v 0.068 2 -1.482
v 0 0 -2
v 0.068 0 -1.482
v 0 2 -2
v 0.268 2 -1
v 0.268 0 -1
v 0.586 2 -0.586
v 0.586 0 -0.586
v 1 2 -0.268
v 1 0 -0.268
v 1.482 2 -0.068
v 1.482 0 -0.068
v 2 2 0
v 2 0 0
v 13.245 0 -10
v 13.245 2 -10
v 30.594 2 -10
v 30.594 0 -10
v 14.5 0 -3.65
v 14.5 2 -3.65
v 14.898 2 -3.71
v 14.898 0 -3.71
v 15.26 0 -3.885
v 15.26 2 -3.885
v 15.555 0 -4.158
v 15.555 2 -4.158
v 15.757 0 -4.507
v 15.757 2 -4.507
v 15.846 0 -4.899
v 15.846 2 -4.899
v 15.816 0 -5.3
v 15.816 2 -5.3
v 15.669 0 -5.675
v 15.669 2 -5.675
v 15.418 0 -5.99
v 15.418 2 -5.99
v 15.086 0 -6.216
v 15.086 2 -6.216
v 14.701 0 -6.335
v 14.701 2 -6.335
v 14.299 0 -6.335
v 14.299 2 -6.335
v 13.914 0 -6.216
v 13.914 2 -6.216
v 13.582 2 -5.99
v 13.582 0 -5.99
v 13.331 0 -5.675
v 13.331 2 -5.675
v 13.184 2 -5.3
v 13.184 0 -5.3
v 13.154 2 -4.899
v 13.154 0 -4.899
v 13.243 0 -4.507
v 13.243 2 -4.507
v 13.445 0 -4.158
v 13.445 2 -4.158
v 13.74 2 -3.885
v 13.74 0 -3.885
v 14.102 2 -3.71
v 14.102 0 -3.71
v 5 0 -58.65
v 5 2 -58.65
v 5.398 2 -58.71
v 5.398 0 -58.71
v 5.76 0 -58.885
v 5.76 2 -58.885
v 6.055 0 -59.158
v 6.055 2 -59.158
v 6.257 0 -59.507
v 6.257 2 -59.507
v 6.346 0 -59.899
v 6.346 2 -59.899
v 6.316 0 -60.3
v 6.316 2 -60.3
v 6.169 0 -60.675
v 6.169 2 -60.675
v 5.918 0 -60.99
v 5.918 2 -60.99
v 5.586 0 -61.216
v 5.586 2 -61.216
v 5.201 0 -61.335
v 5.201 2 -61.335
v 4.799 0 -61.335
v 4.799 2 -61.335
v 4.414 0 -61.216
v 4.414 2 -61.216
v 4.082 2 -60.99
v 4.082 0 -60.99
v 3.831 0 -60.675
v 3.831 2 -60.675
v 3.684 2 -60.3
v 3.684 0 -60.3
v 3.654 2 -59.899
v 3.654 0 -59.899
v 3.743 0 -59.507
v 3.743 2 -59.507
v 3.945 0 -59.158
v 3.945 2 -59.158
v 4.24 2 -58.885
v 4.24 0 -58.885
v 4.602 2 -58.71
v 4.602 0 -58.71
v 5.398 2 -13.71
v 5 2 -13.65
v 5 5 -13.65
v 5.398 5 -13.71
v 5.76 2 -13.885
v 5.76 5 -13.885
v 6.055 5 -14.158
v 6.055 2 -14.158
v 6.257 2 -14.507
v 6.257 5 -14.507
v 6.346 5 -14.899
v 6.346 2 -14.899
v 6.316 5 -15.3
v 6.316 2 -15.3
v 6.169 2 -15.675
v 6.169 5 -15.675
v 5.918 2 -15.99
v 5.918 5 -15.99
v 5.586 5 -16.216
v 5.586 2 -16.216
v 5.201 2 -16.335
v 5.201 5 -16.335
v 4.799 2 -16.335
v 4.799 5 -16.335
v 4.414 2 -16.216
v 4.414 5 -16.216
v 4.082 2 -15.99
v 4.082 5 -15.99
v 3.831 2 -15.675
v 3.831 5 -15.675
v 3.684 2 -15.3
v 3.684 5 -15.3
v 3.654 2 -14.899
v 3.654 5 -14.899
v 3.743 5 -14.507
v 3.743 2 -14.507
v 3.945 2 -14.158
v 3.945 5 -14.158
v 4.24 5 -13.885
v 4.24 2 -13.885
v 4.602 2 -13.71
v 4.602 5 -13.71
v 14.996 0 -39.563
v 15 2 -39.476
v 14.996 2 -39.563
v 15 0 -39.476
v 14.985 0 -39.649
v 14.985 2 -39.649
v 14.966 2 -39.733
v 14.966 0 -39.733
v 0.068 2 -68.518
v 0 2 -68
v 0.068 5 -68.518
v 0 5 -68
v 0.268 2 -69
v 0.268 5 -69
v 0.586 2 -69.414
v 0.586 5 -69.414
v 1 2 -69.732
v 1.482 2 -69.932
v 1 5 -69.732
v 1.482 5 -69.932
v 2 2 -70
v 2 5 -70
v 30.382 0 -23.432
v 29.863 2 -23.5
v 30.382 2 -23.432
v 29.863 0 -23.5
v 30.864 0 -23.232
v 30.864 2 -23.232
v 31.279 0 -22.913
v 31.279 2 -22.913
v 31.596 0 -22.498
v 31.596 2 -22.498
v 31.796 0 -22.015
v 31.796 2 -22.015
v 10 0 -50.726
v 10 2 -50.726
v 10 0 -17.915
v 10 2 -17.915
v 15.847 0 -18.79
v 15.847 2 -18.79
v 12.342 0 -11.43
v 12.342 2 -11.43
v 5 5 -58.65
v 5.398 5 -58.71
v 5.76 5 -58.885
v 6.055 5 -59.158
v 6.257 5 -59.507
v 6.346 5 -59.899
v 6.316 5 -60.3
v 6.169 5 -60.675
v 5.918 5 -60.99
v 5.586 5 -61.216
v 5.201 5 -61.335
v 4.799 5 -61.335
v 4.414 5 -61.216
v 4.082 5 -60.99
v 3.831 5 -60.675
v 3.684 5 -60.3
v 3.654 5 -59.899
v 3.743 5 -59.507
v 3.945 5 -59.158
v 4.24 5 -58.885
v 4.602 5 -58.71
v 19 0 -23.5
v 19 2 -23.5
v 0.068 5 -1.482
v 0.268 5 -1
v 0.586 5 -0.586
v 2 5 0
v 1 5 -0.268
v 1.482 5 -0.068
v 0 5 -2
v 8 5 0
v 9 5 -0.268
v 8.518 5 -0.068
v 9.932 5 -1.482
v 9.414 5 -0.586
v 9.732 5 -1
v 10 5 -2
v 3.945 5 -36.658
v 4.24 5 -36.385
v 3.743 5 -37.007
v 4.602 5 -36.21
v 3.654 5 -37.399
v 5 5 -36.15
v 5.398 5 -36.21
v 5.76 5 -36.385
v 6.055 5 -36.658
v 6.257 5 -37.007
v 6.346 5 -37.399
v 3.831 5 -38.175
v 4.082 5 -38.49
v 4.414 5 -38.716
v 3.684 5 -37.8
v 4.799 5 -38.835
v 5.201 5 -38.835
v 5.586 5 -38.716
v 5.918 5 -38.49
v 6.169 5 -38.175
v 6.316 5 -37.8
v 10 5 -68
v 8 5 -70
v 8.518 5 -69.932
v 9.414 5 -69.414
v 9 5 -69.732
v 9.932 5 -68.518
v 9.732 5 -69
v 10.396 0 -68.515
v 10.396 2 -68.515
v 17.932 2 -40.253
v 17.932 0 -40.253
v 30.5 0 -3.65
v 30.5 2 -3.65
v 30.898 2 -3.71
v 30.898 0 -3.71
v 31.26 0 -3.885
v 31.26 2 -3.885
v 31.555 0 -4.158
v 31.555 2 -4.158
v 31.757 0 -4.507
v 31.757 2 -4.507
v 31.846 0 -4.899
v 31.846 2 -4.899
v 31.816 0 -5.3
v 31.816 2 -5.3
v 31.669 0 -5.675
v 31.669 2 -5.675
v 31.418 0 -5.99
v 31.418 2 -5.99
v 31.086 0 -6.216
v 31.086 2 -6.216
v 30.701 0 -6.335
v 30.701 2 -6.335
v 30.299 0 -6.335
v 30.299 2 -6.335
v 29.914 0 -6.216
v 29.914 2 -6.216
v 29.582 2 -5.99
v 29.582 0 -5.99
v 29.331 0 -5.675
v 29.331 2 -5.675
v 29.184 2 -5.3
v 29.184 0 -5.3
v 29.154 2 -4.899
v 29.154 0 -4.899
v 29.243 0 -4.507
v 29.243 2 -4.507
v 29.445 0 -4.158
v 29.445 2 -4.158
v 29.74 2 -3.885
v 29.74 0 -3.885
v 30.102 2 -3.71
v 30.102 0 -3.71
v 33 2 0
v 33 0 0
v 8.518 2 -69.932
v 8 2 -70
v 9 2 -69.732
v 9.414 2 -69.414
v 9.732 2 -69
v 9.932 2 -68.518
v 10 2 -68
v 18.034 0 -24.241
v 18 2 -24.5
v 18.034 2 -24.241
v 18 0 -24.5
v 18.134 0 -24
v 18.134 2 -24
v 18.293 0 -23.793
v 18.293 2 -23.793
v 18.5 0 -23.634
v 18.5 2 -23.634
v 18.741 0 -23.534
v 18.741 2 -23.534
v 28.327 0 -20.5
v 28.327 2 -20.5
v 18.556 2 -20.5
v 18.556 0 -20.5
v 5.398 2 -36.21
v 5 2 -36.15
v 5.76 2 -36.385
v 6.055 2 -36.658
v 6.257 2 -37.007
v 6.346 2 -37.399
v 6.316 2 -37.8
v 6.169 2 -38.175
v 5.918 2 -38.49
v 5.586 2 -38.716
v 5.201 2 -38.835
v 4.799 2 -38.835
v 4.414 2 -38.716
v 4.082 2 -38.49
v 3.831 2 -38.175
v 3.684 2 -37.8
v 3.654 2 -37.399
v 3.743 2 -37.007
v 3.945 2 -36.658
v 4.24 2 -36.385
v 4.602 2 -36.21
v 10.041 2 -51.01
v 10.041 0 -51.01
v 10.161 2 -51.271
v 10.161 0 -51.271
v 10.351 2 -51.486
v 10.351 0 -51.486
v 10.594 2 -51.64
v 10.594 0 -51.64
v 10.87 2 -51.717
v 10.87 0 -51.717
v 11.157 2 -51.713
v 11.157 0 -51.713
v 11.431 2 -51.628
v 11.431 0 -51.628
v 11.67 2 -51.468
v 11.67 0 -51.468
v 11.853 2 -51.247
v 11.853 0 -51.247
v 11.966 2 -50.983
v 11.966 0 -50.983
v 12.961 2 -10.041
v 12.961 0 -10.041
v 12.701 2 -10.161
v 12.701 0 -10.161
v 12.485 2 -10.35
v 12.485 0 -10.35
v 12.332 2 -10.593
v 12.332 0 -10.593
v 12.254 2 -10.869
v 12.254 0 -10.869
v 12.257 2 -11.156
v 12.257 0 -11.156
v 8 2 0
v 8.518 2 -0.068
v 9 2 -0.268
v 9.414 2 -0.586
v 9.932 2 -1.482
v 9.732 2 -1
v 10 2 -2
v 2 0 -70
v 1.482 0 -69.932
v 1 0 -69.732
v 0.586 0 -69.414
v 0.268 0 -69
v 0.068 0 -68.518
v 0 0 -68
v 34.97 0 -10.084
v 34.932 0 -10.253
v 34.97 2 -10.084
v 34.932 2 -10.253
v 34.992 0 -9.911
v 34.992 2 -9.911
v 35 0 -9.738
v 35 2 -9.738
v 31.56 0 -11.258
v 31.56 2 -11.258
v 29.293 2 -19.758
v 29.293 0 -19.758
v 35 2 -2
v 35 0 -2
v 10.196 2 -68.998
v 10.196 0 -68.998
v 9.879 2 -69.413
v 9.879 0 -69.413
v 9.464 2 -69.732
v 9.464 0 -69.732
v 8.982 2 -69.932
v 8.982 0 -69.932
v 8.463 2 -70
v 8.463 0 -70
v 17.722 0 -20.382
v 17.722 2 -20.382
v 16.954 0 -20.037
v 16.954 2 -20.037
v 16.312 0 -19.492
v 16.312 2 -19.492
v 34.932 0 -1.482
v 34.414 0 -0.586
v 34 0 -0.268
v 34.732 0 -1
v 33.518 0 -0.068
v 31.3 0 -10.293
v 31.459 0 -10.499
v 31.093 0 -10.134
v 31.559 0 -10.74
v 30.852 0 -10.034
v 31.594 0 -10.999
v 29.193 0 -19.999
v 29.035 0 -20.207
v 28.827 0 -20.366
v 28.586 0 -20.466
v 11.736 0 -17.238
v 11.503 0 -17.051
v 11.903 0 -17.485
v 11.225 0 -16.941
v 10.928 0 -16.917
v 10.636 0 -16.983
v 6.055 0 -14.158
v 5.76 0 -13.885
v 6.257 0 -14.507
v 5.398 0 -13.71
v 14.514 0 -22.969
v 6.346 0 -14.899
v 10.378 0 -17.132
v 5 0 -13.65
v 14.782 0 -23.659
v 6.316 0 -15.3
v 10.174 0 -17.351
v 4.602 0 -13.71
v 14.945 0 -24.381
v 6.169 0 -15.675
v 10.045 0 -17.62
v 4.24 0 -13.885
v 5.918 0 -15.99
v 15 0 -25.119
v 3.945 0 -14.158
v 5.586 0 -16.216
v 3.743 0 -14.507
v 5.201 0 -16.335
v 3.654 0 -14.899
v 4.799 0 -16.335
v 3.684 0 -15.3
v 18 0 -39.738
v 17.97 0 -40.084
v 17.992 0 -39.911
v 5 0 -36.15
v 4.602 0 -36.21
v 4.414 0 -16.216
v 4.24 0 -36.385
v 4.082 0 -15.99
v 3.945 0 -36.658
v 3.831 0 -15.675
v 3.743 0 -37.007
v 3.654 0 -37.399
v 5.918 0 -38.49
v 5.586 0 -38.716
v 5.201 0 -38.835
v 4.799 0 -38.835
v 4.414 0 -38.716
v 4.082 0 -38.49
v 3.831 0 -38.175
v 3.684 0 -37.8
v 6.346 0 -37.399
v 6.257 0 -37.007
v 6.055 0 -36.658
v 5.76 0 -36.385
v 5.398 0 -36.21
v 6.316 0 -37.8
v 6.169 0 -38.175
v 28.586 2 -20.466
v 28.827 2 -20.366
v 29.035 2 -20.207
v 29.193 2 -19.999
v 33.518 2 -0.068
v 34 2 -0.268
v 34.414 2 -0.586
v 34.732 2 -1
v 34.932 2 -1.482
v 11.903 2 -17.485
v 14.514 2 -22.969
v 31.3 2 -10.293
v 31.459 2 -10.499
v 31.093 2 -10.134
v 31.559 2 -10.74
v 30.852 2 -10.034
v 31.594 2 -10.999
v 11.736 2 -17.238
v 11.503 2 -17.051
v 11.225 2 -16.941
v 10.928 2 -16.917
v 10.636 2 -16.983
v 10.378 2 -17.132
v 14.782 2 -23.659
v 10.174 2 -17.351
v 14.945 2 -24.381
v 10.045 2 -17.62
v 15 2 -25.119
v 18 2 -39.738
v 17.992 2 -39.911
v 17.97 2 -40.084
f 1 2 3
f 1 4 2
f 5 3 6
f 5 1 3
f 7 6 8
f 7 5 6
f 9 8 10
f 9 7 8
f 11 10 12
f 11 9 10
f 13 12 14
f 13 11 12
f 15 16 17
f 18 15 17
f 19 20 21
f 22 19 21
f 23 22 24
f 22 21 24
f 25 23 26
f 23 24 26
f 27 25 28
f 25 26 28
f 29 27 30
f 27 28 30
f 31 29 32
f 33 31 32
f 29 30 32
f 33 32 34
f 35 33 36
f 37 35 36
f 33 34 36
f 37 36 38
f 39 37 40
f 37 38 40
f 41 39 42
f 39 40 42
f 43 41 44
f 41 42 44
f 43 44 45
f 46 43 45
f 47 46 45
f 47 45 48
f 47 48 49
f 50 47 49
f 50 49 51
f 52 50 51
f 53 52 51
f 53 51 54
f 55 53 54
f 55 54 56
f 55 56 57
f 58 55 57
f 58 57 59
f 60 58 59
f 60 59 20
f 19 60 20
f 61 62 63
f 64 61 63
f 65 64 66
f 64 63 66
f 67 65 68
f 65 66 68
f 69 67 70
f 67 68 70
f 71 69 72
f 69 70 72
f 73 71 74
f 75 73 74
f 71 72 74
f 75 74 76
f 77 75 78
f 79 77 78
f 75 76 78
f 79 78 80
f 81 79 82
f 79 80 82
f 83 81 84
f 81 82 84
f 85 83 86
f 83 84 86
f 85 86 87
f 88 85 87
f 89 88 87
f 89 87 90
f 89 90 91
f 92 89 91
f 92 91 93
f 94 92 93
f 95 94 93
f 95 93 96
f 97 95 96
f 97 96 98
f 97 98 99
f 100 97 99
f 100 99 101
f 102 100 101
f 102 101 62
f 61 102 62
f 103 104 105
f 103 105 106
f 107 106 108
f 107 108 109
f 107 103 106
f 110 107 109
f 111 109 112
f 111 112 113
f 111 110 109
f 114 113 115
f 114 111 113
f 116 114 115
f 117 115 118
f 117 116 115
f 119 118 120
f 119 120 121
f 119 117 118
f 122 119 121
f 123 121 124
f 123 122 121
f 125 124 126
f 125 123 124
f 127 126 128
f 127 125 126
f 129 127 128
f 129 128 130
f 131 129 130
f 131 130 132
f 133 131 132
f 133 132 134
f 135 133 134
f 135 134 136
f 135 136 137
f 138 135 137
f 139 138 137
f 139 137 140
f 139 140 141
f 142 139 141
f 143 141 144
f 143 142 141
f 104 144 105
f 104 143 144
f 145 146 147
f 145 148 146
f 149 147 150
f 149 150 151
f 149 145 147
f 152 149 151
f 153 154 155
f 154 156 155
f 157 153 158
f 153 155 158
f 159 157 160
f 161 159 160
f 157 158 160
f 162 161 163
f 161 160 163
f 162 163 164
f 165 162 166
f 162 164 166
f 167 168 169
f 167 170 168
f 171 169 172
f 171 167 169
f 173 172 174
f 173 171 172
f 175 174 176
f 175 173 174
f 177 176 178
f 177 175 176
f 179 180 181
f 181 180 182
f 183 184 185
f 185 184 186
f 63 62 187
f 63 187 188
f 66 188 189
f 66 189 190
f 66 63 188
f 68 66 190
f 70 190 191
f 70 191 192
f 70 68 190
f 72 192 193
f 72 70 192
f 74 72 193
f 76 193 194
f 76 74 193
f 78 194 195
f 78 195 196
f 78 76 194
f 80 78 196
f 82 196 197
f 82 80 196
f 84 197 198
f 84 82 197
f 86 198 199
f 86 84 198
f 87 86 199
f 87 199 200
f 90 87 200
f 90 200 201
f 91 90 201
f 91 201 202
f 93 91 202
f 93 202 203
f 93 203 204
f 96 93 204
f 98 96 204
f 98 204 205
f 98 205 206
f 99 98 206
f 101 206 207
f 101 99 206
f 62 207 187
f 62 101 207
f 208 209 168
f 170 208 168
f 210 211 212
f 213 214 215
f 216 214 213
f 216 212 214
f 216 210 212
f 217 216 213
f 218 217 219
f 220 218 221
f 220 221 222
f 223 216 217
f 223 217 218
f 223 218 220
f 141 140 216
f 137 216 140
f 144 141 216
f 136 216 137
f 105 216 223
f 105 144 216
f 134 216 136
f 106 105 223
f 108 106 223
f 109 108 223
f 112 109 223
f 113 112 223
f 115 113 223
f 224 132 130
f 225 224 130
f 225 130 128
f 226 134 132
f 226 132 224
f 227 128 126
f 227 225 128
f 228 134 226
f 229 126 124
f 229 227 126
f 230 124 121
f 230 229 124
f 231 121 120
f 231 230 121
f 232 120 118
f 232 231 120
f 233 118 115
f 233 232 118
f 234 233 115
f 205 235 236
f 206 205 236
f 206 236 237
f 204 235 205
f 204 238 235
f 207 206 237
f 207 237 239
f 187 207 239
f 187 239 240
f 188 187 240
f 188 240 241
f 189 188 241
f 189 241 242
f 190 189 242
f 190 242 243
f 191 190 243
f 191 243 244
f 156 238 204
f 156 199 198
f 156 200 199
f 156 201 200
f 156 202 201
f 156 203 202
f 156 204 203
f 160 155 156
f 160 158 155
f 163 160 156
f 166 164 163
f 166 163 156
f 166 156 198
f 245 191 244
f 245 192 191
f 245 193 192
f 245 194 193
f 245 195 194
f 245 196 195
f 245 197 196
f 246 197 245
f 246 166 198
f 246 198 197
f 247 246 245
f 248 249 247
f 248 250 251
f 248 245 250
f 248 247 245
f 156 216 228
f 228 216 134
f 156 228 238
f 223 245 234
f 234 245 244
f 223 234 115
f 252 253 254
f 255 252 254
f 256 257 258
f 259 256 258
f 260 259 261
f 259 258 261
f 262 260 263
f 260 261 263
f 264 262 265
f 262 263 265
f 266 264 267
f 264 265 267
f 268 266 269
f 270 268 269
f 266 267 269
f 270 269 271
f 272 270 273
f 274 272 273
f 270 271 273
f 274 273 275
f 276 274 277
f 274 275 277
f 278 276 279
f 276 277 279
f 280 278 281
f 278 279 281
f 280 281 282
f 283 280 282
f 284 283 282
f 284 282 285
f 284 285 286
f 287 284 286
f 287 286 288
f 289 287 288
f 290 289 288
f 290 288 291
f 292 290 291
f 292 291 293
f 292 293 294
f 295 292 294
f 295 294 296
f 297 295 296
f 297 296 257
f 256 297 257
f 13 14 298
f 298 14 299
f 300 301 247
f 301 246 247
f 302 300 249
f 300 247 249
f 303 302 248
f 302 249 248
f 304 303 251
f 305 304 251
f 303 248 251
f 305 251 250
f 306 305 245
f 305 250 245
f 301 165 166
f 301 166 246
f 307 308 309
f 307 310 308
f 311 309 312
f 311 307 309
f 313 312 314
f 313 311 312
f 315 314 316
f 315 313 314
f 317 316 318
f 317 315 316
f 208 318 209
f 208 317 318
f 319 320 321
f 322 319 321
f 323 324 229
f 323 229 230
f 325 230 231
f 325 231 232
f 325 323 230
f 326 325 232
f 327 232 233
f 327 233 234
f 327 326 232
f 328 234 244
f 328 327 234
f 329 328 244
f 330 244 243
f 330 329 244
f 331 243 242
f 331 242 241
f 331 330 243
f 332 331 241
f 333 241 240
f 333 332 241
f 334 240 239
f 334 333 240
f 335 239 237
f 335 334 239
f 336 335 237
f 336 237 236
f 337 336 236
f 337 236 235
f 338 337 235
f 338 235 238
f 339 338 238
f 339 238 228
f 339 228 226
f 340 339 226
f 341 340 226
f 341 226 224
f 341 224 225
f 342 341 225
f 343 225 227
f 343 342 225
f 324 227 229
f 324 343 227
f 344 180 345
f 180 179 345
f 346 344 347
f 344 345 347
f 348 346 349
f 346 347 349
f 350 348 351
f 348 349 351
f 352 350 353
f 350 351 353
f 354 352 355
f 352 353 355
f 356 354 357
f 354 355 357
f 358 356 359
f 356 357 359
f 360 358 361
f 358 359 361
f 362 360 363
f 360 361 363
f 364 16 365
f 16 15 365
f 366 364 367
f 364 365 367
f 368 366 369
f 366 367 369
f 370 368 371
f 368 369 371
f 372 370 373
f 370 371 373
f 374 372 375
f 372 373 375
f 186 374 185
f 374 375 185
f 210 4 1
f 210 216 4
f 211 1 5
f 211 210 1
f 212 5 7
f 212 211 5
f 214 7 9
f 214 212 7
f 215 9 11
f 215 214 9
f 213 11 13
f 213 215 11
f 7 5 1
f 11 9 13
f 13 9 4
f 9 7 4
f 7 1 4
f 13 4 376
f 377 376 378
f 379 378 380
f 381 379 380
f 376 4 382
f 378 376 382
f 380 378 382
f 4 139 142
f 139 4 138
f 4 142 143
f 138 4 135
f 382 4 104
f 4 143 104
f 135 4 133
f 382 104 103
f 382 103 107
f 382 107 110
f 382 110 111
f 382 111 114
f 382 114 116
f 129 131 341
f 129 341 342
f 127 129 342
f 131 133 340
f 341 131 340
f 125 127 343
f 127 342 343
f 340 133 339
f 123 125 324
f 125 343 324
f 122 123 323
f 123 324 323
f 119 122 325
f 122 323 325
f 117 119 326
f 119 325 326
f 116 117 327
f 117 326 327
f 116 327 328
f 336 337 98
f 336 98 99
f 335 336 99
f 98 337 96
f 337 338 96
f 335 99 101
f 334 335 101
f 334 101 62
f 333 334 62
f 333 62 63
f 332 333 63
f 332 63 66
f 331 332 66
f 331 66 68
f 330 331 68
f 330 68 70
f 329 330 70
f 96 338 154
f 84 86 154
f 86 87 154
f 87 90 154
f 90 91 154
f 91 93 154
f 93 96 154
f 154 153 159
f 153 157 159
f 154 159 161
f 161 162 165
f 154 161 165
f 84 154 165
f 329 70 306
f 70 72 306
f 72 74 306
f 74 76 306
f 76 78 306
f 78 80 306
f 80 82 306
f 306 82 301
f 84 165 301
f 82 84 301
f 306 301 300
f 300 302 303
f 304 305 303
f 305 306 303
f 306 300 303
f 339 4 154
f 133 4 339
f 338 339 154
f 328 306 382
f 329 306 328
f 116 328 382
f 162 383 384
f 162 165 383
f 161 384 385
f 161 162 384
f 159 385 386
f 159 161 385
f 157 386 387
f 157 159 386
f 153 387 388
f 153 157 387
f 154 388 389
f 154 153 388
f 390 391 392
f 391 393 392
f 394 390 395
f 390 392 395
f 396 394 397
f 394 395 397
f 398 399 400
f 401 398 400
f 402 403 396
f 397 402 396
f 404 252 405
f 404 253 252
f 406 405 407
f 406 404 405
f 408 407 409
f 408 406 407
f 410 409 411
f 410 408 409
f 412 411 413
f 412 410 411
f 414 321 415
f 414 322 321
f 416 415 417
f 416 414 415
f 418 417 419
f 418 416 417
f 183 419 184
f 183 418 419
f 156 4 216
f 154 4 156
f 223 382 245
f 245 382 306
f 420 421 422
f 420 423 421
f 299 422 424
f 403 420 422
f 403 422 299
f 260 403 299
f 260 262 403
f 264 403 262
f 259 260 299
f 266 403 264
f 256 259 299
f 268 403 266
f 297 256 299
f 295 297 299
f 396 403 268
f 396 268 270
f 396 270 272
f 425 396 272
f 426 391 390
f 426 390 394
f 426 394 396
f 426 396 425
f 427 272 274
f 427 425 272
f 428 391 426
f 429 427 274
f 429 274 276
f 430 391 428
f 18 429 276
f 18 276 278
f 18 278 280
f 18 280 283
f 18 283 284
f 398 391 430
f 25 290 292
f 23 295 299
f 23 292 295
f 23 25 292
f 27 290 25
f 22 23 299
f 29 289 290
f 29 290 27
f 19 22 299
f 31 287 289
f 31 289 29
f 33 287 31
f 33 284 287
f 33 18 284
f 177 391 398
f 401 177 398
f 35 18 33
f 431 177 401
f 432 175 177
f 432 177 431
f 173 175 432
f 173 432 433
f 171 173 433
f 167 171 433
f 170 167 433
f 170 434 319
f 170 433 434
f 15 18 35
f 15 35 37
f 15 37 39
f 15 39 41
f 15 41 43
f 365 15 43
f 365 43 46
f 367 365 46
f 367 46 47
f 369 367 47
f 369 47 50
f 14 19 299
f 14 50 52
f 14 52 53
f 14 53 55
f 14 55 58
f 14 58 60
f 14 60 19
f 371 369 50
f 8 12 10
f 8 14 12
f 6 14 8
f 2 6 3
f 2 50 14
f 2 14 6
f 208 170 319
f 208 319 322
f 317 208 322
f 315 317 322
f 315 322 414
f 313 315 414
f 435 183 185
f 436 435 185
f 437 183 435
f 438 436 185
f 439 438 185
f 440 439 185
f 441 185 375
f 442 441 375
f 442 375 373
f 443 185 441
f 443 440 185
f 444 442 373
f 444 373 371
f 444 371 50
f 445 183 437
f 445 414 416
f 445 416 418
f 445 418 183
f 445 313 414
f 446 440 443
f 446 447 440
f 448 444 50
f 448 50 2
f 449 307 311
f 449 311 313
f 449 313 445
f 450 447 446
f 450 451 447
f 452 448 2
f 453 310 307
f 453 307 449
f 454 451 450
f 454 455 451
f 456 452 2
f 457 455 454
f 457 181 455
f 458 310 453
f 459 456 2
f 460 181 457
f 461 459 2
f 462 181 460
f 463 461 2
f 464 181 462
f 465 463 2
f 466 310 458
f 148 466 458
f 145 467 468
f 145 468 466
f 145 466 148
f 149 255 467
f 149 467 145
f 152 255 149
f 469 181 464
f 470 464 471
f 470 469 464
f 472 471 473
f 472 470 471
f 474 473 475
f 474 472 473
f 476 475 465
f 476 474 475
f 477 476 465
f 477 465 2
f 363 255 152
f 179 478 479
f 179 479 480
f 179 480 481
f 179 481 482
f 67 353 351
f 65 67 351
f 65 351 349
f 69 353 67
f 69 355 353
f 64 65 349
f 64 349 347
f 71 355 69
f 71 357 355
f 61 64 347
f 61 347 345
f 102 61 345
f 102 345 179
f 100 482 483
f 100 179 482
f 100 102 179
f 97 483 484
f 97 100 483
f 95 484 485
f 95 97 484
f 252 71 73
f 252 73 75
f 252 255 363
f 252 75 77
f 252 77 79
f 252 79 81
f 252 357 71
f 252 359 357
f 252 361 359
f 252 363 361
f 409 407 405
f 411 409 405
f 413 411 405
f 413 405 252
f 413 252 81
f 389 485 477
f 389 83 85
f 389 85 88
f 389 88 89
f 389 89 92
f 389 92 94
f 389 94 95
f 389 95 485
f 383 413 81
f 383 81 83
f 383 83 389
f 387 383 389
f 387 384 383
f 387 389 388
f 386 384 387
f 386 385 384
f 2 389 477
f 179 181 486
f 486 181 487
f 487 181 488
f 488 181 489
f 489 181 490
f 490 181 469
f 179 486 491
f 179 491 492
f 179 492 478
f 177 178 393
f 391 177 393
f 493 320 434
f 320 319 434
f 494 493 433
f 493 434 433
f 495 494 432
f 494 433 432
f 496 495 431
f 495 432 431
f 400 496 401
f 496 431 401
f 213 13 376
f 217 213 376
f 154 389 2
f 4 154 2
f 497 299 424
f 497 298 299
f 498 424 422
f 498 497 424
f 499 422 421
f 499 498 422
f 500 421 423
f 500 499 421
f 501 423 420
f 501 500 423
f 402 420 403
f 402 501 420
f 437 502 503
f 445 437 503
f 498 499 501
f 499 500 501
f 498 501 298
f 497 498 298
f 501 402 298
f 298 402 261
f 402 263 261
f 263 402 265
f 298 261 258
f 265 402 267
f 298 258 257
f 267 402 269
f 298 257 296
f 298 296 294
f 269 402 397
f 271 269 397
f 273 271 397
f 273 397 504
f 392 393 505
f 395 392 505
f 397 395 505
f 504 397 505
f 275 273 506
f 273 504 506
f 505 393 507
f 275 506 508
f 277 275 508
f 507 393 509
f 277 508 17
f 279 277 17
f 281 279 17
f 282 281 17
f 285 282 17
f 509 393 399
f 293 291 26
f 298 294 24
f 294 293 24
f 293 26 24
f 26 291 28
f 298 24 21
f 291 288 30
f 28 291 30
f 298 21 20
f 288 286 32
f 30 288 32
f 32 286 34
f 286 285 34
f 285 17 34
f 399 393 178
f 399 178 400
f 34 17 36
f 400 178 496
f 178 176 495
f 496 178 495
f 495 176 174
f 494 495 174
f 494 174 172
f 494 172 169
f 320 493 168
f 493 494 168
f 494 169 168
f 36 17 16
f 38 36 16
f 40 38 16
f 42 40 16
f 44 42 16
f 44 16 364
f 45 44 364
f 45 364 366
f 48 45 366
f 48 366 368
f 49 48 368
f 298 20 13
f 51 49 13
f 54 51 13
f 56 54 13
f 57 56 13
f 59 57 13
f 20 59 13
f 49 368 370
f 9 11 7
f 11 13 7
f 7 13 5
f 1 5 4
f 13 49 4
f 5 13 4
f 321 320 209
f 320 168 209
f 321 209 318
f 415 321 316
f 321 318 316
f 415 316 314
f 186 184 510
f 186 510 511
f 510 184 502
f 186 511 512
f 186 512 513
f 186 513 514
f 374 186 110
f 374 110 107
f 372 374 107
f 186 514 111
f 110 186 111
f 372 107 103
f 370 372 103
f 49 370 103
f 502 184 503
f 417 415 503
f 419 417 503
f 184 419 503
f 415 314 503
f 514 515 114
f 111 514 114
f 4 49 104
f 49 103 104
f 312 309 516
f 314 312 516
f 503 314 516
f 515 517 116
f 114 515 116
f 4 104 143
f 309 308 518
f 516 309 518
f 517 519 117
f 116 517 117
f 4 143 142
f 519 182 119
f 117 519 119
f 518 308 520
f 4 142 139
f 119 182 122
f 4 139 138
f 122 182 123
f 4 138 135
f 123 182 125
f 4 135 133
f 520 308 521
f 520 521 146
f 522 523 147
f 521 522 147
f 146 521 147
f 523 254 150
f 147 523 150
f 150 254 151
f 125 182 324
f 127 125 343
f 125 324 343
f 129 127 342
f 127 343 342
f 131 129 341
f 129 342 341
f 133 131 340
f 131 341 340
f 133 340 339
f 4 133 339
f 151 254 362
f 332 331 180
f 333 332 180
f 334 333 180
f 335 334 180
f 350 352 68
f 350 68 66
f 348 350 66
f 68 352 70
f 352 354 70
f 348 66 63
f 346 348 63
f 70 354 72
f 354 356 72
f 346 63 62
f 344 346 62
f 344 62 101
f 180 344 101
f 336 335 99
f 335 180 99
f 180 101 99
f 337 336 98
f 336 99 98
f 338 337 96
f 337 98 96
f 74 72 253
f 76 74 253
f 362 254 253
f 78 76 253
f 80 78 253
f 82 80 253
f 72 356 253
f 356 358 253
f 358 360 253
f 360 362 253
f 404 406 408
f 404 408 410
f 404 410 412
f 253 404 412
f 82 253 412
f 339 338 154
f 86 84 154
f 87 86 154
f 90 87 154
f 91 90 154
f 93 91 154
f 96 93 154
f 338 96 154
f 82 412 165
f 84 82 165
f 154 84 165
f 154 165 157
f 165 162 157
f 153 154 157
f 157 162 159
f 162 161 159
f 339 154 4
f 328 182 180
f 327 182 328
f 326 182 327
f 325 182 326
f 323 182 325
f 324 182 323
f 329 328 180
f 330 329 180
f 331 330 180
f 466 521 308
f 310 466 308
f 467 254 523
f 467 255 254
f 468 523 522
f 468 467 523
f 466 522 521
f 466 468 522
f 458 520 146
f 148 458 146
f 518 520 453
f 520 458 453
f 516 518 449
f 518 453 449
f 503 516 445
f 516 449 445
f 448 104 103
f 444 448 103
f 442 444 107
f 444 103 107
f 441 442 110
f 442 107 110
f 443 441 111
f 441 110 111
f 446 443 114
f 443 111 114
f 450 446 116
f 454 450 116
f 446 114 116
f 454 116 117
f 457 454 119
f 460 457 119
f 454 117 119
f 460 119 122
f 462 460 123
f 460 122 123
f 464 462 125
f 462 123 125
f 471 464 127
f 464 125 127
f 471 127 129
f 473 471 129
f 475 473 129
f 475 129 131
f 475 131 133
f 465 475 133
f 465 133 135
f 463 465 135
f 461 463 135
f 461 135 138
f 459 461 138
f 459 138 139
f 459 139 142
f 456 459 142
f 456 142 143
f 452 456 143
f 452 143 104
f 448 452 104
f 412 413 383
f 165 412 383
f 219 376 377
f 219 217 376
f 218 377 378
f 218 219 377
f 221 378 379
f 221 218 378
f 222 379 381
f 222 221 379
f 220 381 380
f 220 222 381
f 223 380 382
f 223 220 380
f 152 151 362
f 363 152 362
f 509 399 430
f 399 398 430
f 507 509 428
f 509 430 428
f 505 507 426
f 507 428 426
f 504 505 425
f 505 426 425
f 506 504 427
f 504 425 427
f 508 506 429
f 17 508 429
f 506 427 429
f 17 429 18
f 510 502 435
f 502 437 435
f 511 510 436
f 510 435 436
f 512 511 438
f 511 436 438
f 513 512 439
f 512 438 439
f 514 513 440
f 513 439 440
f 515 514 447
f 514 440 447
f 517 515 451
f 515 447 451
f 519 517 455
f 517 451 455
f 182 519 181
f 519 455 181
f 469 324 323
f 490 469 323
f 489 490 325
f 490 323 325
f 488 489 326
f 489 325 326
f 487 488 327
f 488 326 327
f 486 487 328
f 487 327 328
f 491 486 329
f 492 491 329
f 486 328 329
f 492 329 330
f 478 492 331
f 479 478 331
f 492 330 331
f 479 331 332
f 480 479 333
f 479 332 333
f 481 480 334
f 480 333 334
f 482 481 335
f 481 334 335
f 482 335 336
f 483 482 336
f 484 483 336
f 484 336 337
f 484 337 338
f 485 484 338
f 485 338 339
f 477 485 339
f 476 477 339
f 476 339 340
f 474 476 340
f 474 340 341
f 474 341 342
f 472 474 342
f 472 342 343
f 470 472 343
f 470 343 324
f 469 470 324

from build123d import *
from OCP.BRepFilletAPI import BRepFilletAPI_MakeFillet

# Parameters (mm, degrees)
EXTRUDE_1_DEPTH     = 2
CUT_EXTRUDE_1_DEPTH = 3
SKETCH_3_R          = 1.35
CUT_EXTRUDE_2_DEPTH = 79.287930104
EXTRUDE_2_DEPTH     = 2
CUT_EXTRUDE_3_DEPTH = 10
FILLET_2_R          = 2
FILLET_3_R1         = 1
FILLET_3_R2         = 3
FILLET_3_R3         = 5
SKETCH_8_W          = 10
SKETCH_8_H          = 70
SKETCH_8_R          = 1.35
EXTRUDE_4_DEPTH     = 3
FILLET_5_R          = 2


with BuildPart() as part:
    # 草图1 → 凸台-拉伸1 (new body)
    with BuildSketch(Plane(origin=(0, 0, 0), x_dir=(1, 0, 0), z_dir=(0, 1, 0))):
        Polygon((0, 0), (35, 0), (35, 10), (10, 70), (0, 70), align=None)
    extrude(amount=EXTRUDE_1_DEPTH)

    # 草图2 → 切除-拉伸1 (cut)
    with BuildSketch(Plane(origin=(0, 2, 0), x_dir=(1, 0, 0), z_dir=(0, 1, 0))):
        Polygon((35, 10), (10, 10), (10, 70), align=None)
    extrude(amount=-CUT_EXTRUDE_1_DEPTH, mode=Mode.SUBTRACT)

    # 草图3 → 切除-拉伸2 (cut, through all)
    with BuildSketch(Plane(origin=(0, 2, 0), x_dir=(1, 0, 0), z_dir=(0, 1, 0))):
        with Locations(Location((30.5, 5, 0), (0, 0, 270))):
            Circle(SKETCH_3_R)
        with Locations(Location((14.5, 5, 0), (0, 0, 270))):
            Circle(SKETCH_3_R)
        with Locations(Location((5, 15, 0), (0, 0, 270))):
            Circle(SKETCH_3_R)
        with Locations(Location((5, 60, 0), (0, 0, 270))):
            Circle(SKETCH_3_R)
        with Locations(Location((5, 37.5, 0), (0, 0, 270))):
            Circle(SKETCH_3_R)
    extrude(amount=-CUT_EXTRUDE_2_DEPTH, mode=Mode.SUBTRACT)

    # 草图4 → 凸台-拉伸2 (add)
    with BuildSketch(Plane(origin=(0, 2, 0), x_dir=(1, 0, 0), z_dir=(0, 1, 0))):
        Polygon((10, 70), (18, 40), (18, 23.5), (31.4, 23.5), (35, 10), (10, 10), align=None)
    extrude(amount=-EXTRUDE_2_DEPTH)

    # 草图5 → 切除-拉伸3 (cut)
    with BuildSketch(Plane(origin=(0, 2, 0), x_dir=(1, 0, 0), z_dir=(0, 1, 0))):
        Polygon((15, 39.606868978), (10, 58.356868978), (10, 13.488911005), (15, 23.988911005), align=None)
        Polygon((16.661386193, 20.5), (11.661386193, 10), (31.895165061, 10), (29.095165061, 20.5), align=None)
    extrude(amount=-CUT_EXTRUDE_3_DEPTH, mode=Mode.SUBTRACT)

    # 圆角2
    fillet_2_edges = [part.edges().sort_by_distance(p)[0] for p in [
        (18, 1, -40),
        (31.4, 1, -23.5),
        (0, 1, -70),
        (10, 1, -70),
        (35, 1, -10),
        (35, 1, 0),
        (0, 1, 0),
    ]]
    fillet(fillet_2_edges, radius=FILLET_2_R)

    # 圆角3: one fillet with a radius per group of edges: ONE call of the kernel's fillet builder (fillet() takes one radius for all edges)
    fillet_3_edges_1 = [part.edges().sort_by_distance(p)[0] for p in [
        (15, 1, -39.606868978),
        (31.895165061, 1, -10),
        (29.095165061, 1, -20.5),
        (11.661386193, 1, -10),
        (10, 1, -58.356868978),
        (10, 1, -13.488911005),
        (18, 1, -23.5),
    ]]
    fillet_3_edges_2 = [part.edges().sort_by_distance(p)[0] for p in [
        (16.661386193, 1, -20.5),
    ]]
    fillet_3_edges_3 = [part.edges().sort_by_distance(p)[0] for p in [
        (15, 1, -23.988911005),
    ]]
    fillet_3 = BRepFilletAPI_MakeFillet(part.part.solid().wrapped)
    for e in fillet_3_edges_1:
        fillet_3.Add(FILLET_3_R1, e.wrapped)
    for e in fillet_3_edges_2:
        fillet_3.Add(FILLET_3_R2, e.wrapped)
    for e in fillet_3_edges_3:
        fillet_3.Add(FILLET_3_R3, e.wrapped)
    add(Compound.cast(fillet_3.Shape()), mode=Mode.REPLACE)


with BuildPart() as body_2:
    # 草图8 → 凸台-拉伸4 (new body)
    with BuildSketch(Plane(origin=(0, 2, 0), x_dir=(1, 0, 0), z_dir=(0, 1, 0))):
        with Locations((5, 35)):
            Rectangle(SKETCH_8_W, SKETCH_8_H)
        with Locations(Location((5, 15, 0), (0, 0, 270))):
            Circle(SKETCH_8_R, mode=Mode.SUBTRACT)
        with Locations(Location((5, 37.5, 0), (0, 0, 270))):
            Circle(SKETCH_8_R, mode=Mode.SUBTRACT)
        with Locations(Location((5, 60, 0), (0, 0, 270))):
            Circle(SKETCH_8_R, mode=Mode.SUBTRACT)
    extrude(amount=EXTRUDE_4_DEPTH)

    # 圆角5
    fillet_5_edges = [body_2.edges().sort_by_distance(p)[0] for p in [
        (0, 3.5, -70),
        (10, 3.5, -70),
        (10, 3.5, 0),
        (0, 3.5, 0),
    ]]
    fillet(fillet_5_edges, radius=FILLET_5_R)


solid = Compound([part.part, body_2.part])
